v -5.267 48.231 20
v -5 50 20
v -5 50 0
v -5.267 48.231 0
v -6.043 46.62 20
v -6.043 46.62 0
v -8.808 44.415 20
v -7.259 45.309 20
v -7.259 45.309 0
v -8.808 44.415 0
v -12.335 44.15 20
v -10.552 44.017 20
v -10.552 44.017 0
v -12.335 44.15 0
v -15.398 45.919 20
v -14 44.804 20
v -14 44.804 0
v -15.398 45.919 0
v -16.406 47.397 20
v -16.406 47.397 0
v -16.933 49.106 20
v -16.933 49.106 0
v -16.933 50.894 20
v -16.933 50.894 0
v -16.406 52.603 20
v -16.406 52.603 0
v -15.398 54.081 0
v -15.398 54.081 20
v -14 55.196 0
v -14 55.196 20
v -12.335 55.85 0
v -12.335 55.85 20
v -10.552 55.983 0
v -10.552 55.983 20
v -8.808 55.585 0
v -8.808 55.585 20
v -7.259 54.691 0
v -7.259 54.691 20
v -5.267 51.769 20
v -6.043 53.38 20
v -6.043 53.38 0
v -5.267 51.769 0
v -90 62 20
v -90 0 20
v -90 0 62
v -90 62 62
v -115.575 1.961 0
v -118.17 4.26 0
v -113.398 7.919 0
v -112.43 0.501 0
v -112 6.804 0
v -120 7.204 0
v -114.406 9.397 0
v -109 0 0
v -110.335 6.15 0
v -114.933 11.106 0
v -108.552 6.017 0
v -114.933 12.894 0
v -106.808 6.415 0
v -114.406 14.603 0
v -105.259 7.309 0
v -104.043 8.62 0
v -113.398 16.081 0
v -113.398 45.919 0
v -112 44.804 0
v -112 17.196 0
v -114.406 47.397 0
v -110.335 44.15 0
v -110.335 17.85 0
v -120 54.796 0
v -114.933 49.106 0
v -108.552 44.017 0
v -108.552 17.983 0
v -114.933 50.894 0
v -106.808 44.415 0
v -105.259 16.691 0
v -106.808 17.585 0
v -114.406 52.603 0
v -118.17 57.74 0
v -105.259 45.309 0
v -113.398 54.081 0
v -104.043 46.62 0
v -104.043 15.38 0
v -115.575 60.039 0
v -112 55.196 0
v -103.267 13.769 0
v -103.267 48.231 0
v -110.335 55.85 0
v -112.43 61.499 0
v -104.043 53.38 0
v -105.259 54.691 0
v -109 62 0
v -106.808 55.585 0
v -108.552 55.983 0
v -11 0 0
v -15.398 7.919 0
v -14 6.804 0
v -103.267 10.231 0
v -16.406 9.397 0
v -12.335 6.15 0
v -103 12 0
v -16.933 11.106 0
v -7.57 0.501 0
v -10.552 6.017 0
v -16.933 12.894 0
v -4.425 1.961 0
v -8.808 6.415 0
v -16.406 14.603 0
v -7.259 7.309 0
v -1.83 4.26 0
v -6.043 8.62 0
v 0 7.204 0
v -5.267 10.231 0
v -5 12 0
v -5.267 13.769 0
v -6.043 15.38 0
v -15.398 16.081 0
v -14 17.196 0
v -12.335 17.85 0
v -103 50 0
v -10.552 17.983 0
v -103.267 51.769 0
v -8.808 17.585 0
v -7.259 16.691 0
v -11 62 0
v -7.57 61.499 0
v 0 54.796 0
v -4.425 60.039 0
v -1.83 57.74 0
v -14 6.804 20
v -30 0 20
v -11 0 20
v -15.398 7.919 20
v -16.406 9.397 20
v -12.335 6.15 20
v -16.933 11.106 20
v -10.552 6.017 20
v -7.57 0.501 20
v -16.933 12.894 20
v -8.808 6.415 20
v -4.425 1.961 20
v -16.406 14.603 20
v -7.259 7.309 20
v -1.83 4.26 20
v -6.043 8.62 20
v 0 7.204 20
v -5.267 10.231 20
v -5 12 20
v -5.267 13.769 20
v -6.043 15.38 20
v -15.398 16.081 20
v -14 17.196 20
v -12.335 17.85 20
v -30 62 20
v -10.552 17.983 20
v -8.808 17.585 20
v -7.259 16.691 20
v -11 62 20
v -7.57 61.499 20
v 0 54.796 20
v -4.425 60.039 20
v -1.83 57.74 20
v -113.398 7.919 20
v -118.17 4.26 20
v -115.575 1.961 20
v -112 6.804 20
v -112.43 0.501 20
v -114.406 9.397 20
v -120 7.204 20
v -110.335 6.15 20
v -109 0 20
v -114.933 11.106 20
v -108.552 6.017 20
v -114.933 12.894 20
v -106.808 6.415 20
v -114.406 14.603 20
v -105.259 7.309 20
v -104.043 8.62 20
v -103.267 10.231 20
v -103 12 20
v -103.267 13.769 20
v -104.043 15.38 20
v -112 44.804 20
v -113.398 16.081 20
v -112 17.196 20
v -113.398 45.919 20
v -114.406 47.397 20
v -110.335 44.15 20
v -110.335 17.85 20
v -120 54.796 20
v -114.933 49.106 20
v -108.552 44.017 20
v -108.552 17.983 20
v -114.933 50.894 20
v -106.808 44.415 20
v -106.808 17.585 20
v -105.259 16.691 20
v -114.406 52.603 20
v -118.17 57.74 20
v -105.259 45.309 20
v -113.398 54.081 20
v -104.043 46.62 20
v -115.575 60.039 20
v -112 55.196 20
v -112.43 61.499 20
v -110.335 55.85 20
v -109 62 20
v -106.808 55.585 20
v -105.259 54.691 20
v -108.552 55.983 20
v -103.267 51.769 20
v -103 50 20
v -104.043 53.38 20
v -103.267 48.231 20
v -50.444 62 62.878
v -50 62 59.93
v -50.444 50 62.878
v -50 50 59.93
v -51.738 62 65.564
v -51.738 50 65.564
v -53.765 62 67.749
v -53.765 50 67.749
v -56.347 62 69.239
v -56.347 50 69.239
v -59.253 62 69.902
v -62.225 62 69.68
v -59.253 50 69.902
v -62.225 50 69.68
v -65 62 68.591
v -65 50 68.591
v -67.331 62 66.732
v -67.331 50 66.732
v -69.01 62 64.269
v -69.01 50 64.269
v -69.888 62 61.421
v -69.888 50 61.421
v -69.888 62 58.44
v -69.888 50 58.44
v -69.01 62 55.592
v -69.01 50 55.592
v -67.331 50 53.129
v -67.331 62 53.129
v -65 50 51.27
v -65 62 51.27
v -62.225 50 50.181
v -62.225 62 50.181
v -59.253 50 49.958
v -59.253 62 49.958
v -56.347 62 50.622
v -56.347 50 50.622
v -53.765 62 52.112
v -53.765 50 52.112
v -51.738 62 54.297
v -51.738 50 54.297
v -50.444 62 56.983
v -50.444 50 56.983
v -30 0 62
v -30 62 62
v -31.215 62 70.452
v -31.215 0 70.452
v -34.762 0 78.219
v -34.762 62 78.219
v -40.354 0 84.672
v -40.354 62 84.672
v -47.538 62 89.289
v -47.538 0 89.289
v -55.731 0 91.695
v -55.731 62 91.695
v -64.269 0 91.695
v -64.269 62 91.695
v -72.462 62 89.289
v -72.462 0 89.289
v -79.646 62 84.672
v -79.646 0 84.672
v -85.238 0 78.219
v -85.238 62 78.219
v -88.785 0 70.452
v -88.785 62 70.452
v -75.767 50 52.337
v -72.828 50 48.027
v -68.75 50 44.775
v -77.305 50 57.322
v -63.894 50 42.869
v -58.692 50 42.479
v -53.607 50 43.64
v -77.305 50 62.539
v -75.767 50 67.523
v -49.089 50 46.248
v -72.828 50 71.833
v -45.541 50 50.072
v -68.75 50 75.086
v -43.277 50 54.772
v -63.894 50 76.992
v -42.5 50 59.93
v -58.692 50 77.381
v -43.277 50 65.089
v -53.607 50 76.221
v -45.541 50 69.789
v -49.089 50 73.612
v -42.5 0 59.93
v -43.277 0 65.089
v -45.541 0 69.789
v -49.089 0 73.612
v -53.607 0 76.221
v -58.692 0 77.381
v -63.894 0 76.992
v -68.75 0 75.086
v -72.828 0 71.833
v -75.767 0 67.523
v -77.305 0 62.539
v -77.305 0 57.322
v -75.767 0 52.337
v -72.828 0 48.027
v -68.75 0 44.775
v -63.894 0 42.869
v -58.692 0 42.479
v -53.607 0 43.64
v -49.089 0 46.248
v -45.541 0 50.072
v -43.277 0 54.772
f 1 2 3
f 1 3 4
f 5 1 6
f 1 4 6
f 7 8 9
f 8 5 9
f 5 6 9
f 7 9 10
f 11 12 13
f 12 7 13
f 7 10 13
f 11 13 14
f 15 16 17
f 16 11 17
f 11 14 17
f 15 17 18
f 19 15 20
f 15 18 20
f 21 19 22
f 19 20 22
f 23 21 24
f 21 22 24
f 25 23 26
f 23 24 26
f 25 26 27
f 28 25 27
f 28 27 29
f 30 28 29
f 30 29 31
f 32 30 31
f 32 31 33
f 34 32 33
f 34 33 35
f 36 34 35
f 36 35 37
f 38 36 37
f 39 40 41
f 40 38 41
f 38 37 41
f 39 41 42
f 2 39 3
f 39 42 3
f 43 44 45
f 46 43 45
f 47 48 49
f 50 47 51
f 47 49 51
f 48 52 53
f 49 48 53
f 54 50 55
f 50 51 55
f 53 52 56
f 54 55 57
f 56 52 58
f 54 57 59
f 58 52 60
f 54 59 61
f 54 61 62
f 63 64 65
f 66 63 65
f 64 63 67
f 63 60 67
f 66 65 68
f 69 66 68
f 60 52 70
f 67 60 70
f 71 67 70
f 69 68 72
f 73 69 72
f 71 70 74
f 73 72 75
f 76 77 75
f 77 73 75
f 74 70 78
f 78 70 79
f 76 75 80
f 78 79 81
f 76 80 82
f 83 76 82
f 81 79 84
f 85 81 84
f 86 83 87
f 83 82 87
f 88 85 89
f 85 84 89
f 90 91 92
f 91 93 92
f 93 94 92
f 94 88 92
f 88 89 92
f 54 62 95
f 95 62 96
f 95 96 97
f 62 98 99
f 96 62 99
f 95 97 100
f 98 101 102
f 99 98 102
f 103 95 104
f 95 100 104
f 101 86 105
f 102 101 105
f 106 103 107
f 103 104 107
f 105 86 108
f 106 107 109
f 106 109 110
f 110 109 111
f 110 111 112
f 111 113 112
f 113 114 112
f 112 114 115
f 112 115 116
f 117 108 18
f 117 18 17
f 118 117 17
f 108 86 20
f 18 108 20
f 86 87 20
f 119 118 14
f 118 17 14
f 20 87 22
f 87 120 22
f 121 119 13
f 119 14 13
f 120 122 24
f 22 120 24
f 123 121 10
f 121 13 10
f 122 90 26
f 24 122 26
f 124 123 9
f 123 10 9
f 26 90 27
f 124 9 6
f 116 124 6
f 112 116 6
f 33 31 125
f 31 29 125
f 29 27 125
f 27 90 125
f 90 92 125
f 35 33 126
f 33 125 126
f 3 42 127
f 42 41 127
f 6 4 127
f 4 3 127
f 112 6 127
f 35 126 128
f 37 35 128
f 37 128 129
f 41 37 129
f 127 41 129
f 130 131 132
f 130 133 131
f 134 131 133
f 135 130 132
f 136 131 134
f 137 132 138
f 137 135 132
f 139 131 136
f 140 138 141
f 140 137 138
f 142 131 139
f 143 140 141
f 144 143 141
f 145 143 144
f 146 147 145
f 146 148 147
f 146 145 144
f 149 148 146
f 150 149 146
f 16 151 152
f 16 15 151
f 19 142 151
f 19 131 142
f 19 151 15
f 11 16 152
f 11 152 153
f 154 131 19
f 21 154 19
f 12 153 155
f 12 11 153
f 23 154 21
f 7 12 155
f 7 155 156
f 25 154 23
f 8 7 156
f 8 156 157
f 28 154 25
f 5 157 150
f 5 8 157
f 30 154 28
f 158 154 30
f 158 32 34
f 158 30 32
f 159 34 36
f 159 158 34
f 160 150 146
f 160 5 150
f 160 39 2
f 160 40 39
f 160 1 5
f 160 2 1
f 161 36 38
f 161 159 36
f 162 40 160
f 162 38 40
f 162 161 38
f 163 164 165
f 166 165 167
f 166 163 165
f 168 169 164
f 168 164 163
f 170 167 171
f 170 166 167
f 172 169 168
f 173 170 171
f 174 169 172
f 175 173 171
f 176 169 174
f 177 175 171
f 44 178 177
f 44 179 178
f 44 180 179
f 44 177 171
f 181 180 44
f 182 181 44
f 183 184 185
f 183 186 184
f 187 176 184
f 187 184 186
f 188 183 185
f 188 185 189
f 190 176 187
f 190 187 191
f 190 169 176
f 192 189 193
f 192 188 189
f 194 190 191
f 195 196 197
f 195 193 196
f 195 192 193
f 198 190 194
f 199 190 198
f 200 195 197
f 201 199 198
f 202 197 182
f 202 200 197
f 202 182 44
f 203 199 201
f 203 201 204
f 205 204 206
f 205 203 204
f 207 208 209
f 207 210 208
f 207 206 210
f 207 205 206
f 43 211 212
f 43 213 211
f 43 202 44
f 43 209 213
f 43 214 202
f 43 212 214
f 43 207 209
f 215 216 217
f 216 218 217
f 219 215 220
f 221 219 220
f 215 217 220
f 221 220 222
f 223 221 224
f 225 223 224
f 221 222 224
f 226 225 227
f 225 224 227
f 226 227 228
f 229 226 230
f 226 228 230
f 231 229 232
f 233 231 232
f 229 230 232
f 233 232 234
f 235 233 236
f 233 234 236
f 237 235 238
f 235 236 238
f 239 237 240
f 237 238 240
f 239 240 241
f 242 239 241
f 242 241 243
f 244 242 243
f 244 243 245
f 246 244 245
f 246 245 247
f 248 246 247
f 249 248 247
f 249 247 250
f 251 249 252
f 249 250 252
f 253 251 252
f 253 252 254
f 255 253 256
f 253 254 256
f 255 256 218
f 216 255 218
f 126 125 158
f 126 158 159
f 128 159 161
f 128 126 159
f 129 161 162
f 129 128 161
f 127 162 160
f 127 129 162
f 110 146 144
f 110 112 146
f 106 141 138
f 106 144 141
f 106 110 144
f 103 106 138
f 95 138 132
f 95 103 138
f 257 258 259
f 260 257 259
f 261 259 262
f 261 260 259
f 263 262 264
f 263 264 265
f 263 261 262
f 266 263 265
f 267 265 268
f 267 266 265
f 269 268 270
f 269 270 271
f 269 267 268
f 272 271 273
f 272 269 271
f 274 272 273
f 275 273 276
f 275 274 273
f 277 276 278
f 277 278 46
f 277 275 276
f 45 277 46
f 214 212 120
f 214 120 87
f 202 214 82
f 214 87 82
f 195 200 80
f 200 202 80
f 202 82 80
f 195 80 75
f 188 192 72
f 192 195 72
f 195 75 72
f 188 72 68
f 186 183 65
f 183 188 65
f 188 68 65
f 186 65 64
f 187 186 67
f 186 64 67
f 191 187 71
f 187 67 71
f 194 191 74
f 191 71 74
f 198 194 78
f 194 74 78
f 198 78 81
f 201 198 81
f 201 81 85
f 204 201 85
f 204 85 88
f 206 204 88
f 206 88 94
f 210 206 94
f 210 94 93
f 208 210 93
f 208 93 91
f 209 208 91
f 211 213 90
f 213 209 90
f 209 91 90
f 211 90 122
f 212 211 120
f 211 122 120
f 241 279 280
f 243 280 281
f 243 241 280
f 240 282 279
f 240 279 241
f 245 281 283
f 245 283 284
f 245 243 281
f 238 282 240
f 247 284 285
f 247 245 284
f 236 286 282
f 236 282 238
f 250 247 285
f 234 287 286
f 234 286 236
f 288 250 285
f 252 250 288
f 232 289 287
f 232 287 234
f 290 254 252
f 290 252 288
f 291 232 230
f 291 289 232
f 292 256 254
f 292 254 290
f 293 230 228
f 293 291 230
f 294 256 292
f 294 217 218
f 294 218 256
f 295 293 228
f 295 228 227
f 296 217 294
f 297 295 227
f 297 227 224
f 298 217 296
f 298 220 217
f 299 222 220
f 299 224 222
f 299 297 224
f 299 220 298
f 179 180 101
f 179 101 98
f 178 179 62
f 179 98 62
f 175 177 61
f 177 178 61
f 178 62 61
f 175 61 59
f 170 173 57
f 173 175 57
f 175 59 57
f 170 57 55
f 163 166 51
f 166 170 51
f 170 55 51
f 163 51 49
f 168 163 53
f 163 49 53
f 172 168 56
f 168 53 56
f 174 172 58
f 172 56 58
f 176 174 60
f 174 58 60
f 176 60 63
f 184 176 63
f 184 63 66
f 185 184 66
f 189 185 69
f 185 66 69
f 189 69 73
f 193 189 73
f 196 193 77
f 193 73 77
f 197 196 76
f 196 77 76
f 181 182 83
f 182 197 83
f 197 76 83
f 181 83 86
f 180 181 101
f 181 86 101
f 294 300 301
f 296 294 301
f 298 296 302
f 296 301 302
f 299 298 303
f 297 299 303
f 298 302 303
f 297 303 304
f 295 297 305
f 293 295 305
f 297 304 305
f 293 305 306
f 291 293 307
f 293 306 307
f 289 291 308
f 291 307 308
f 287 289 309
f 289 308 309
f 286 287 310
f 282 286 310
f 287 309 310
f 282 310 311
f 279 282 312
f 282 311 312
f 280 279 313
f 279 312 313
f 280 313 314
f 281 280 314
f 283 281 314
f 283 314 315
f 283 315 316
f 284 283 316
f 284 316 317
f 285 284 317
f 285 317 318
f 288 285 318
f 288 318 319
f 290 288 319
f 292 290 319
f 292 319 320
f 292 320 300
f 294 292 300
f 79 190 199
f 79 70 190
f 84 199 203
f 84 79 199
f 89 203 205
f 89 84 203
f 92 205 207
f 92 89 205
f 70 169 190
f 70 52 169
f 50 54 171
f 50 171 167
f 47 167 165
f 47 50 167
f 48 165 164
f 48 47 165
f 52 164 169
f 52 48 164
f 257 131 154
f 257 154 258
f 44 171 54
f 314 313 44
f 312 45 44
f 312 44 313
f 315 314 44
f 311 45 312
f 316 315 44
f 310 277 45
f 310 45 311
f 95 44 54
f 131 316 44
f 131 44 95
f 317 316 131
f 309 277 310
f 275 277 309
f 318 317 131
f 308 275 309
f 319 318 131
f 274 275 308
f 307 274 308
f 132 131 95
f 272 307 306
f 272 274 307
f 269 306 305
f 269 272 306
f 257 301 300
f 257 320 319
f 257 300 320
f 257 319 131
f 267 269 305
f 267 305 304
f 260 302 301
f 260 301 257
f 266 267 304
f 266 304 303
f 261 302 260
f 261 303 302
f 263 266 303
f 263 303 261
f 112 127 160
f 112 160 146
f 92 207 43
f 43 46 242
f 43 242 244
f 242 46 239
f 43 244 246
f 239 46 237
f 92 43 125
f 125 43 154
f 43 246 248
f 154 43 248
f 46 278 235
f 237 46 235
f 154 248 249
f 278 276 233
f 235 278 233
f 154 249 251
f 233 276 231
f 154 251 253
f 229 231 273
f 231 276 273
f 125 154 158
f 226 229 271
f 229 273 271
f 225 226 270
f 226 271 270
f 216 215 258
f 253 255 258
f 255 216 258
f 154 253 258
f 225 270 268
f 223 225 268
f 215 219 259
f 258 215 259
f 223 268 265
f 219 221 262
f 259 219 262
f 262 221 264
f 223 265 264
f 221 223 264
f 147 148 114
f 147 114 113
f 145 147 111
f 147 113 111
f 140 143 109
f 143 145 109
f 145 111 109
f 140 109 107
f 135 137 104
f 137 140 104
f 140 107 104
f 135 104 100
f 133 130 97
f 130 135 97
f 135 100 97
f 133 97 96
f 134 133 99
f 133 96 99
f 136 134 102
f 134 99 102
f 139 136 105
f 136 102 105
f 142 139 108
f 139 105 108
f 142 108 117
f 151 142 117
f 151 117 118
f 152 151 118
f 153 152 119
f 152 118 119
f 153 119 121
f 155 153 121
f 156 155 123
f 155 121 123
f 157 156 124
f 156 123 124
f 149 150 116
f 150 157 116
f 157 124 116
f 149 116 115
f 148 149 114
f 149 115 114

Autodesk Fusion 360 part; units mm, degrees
sketch "Sketch1" plane through (0, 0, 0) normal (0, 0, 1) x (1, 0, 0)
  line L0 (0, 0) -> (-120, 0)
  line L1 (-120, 0) -> (-120, 62)
  line L2 (-120, 62) -> (0, 62)
  line L3 (0, 62) -> (0, 0)
  line L4 (-120, 0) -> (-109, 0)
  line L5 (-120, 62) -> (-109, 62)
  line L6 (0, 62) -> (-11, 62)
  line L7 (0, 0) -> (-11, 0)
  line L8 (-120, 62) -> (-120, 50)
  line L9 (-120, 0) -> (-120, 12)
  line L10 (0, 62) -> (0, 50)
  line L11 (0, 0) -> (0, 12)
  circle A0 centre (-109, 12) radius 6
  circle A1 centre (-109, 12) radius 12
  circle A2 centre (-109, 50) radius 6
  circle A3 centre (-109, 50) radius 12
  circle A4 centre (-11, 50) radius 6
  line L12 (-11, 50) -> (-11, 50.4247)
  circle A5 centre (-11, 50) radius 12
  circle A6 centre (-11, 12) radius 6
  circle A7 centre (-11, 12) radius 12
  dimension "d1" = 120
  dimension "d2" = 62
  dimension "d3" = 11
  dimension "d4" = 11
  dimension "d5" = 11
  dimension "d6" = 11
  dimension "d7" = 12
  dimension "d8" = 12
  dimension "d9" = 12
  dimension "d10" = 12
  dimension "d11" = 12
  dimension "d12" = 24
  dimension "d13" = 12
  dimension "d14" = 24
  dimension "d15" = 12
  dimension "d16" = 24
  dimension "d17" = 12
  dimension "d18" = 24
extrude "Extrude1" add sketch "Sketch1" along normal blind 20 contours L0 L1 L2 L3 A1 A3 A5 A7 | L3 L11 A7 | L1 L9 A1 | L3 L10 A5 | L1 L8 A3 picked at (-1.7555, 9.8119) picked at (-118.2445, 14.1881) picked at (-1.7555, 52.1881) picked at (-118.2445, 47.8119)
sketch "Sketch2" plane through (0, 0, 0) normal (0, -1, 0) x (1, 0, 0)
  line L0 (-109, 0) -> (-11, 0)
  line L1 (-11, 0) -> (-11, 20)
  line L2 (-11, 20) -> (-109, 20)
  line L3 (-109, 20) -> (-109, 0)
  line L4 (-109, 20) -> (-11, 20)
  line L5 (-60, 20) -> (-90, 20)
  line L6 (-60, 20) -> (-30, 20)
  line L7 (-90, 20) -> (-90, 62)
  line L8 (-30, 20) -> (-30, 62)
  line L9 (-90, 62) -> (-30, 62)
  dimension "d21" = 30
  dimension "d22" = 30
  dimension "d23" = 42
  dimension "d24" = 42
extrude "Extrude2" add sketch "Sketch2" against normal blind 62 contours L2 L4 L5 L6 L7 L8 L9
sketch "Sketch3" plane through (0, 0, 0) normal (0, -1, 0) x (1, 0, 0)
  line L0 (-109, 0) -> (-11, 0)
  line L1 (-11, 0) -> (-11, 20)
  line L2 (-11, 20) -> (-30, 20)
  line L3 (-30, 20) -> (-30, 62)
  line L4 (-30, 62) -> (-90, 62)
  line L5 (-90, 62) -> (-90, 20)
  line L6 (-90, 20) -> (-109, 20)
  line L7 (-109, 20) -> (-109, 0)
  circle A0 centre (-60, 62) radius 30
  line L8 (-90, 62) -> (-30, 62)
extrude "Extrude3" add sketch "Sketch3" against normal blind 62 contours L4 A0 L8 picked at (-62.2252, 71.7493)
sketch "Sketch4" plane through (0, 0, 0) normal (0, -1, 0) x (1, 0, 0)
  line L0 (-109, 0) -> (-11, 0)
  line L1 (-11, 0) -> (-11, 20)
  line L2 (-11, 20) -> (-30, 20)
  line L3 (-30, 20) -> (-30, 62)
  arc A0 (-30, 62) -> (-90, 62) centre (-60, 62) ccw
  line L4 (-90, 62) -> (-90, 20)
  line L5 (-90, 20) -> (-109, 20)
  line L6 (-109, 20) -> (-109, 0)
  circle A1 centre (-60, 59.9304) radius 17.5
  dimension "d29" = 35
extrude "Extrude4" cut sketch "Sketch4" against normal blind 50 contours A1
sketch "Sketch5" plane through (0, 50, 0) normal (0, -1, 0) x (1, 0, 0)
  circle A0 centre (-60, 59.9304) radius 17.5
  circle A1 centre (-60, 59.9304) radius 10
  dimension "d32" = 20
extrude "Extrude5" cut sketch "Sketch5" against normal blind 35 contours A1
sketch "Sketch6" plane through (0, 0, 0) normal (0, 0, -1) x (1, 0, 0)
  circle A0 centre (-109, -12) radius 6
  circle A1 centre (-11, -12) radius 6
  circle A2 centre (-11, -50) radius 6
  circle A3 centre (-109, -50) radius 6
  arc A4 (-11, -62) -> (0, -54.7958) centre (-11, -50) ccw
  line L0 (0, -54.7958) -> (0, -7.2042)
  arc A5 (0, -7.2042) -> (-11, 0) centre (-11, -12) ccw
  line L1 (-11, 0) -> (-109, 0)
  arc A6 (-109, 0) -> (-120, -7.2042) centre (-109, -12) ccw
  line L2 (-120, -7.2042) -> (-120, -54.7958)
  arc A7 (-120, -54.7958) -> (-109, -62) centre (-109, -50) ccw
  line L3 (-109, -62) -> (-11, -62)
